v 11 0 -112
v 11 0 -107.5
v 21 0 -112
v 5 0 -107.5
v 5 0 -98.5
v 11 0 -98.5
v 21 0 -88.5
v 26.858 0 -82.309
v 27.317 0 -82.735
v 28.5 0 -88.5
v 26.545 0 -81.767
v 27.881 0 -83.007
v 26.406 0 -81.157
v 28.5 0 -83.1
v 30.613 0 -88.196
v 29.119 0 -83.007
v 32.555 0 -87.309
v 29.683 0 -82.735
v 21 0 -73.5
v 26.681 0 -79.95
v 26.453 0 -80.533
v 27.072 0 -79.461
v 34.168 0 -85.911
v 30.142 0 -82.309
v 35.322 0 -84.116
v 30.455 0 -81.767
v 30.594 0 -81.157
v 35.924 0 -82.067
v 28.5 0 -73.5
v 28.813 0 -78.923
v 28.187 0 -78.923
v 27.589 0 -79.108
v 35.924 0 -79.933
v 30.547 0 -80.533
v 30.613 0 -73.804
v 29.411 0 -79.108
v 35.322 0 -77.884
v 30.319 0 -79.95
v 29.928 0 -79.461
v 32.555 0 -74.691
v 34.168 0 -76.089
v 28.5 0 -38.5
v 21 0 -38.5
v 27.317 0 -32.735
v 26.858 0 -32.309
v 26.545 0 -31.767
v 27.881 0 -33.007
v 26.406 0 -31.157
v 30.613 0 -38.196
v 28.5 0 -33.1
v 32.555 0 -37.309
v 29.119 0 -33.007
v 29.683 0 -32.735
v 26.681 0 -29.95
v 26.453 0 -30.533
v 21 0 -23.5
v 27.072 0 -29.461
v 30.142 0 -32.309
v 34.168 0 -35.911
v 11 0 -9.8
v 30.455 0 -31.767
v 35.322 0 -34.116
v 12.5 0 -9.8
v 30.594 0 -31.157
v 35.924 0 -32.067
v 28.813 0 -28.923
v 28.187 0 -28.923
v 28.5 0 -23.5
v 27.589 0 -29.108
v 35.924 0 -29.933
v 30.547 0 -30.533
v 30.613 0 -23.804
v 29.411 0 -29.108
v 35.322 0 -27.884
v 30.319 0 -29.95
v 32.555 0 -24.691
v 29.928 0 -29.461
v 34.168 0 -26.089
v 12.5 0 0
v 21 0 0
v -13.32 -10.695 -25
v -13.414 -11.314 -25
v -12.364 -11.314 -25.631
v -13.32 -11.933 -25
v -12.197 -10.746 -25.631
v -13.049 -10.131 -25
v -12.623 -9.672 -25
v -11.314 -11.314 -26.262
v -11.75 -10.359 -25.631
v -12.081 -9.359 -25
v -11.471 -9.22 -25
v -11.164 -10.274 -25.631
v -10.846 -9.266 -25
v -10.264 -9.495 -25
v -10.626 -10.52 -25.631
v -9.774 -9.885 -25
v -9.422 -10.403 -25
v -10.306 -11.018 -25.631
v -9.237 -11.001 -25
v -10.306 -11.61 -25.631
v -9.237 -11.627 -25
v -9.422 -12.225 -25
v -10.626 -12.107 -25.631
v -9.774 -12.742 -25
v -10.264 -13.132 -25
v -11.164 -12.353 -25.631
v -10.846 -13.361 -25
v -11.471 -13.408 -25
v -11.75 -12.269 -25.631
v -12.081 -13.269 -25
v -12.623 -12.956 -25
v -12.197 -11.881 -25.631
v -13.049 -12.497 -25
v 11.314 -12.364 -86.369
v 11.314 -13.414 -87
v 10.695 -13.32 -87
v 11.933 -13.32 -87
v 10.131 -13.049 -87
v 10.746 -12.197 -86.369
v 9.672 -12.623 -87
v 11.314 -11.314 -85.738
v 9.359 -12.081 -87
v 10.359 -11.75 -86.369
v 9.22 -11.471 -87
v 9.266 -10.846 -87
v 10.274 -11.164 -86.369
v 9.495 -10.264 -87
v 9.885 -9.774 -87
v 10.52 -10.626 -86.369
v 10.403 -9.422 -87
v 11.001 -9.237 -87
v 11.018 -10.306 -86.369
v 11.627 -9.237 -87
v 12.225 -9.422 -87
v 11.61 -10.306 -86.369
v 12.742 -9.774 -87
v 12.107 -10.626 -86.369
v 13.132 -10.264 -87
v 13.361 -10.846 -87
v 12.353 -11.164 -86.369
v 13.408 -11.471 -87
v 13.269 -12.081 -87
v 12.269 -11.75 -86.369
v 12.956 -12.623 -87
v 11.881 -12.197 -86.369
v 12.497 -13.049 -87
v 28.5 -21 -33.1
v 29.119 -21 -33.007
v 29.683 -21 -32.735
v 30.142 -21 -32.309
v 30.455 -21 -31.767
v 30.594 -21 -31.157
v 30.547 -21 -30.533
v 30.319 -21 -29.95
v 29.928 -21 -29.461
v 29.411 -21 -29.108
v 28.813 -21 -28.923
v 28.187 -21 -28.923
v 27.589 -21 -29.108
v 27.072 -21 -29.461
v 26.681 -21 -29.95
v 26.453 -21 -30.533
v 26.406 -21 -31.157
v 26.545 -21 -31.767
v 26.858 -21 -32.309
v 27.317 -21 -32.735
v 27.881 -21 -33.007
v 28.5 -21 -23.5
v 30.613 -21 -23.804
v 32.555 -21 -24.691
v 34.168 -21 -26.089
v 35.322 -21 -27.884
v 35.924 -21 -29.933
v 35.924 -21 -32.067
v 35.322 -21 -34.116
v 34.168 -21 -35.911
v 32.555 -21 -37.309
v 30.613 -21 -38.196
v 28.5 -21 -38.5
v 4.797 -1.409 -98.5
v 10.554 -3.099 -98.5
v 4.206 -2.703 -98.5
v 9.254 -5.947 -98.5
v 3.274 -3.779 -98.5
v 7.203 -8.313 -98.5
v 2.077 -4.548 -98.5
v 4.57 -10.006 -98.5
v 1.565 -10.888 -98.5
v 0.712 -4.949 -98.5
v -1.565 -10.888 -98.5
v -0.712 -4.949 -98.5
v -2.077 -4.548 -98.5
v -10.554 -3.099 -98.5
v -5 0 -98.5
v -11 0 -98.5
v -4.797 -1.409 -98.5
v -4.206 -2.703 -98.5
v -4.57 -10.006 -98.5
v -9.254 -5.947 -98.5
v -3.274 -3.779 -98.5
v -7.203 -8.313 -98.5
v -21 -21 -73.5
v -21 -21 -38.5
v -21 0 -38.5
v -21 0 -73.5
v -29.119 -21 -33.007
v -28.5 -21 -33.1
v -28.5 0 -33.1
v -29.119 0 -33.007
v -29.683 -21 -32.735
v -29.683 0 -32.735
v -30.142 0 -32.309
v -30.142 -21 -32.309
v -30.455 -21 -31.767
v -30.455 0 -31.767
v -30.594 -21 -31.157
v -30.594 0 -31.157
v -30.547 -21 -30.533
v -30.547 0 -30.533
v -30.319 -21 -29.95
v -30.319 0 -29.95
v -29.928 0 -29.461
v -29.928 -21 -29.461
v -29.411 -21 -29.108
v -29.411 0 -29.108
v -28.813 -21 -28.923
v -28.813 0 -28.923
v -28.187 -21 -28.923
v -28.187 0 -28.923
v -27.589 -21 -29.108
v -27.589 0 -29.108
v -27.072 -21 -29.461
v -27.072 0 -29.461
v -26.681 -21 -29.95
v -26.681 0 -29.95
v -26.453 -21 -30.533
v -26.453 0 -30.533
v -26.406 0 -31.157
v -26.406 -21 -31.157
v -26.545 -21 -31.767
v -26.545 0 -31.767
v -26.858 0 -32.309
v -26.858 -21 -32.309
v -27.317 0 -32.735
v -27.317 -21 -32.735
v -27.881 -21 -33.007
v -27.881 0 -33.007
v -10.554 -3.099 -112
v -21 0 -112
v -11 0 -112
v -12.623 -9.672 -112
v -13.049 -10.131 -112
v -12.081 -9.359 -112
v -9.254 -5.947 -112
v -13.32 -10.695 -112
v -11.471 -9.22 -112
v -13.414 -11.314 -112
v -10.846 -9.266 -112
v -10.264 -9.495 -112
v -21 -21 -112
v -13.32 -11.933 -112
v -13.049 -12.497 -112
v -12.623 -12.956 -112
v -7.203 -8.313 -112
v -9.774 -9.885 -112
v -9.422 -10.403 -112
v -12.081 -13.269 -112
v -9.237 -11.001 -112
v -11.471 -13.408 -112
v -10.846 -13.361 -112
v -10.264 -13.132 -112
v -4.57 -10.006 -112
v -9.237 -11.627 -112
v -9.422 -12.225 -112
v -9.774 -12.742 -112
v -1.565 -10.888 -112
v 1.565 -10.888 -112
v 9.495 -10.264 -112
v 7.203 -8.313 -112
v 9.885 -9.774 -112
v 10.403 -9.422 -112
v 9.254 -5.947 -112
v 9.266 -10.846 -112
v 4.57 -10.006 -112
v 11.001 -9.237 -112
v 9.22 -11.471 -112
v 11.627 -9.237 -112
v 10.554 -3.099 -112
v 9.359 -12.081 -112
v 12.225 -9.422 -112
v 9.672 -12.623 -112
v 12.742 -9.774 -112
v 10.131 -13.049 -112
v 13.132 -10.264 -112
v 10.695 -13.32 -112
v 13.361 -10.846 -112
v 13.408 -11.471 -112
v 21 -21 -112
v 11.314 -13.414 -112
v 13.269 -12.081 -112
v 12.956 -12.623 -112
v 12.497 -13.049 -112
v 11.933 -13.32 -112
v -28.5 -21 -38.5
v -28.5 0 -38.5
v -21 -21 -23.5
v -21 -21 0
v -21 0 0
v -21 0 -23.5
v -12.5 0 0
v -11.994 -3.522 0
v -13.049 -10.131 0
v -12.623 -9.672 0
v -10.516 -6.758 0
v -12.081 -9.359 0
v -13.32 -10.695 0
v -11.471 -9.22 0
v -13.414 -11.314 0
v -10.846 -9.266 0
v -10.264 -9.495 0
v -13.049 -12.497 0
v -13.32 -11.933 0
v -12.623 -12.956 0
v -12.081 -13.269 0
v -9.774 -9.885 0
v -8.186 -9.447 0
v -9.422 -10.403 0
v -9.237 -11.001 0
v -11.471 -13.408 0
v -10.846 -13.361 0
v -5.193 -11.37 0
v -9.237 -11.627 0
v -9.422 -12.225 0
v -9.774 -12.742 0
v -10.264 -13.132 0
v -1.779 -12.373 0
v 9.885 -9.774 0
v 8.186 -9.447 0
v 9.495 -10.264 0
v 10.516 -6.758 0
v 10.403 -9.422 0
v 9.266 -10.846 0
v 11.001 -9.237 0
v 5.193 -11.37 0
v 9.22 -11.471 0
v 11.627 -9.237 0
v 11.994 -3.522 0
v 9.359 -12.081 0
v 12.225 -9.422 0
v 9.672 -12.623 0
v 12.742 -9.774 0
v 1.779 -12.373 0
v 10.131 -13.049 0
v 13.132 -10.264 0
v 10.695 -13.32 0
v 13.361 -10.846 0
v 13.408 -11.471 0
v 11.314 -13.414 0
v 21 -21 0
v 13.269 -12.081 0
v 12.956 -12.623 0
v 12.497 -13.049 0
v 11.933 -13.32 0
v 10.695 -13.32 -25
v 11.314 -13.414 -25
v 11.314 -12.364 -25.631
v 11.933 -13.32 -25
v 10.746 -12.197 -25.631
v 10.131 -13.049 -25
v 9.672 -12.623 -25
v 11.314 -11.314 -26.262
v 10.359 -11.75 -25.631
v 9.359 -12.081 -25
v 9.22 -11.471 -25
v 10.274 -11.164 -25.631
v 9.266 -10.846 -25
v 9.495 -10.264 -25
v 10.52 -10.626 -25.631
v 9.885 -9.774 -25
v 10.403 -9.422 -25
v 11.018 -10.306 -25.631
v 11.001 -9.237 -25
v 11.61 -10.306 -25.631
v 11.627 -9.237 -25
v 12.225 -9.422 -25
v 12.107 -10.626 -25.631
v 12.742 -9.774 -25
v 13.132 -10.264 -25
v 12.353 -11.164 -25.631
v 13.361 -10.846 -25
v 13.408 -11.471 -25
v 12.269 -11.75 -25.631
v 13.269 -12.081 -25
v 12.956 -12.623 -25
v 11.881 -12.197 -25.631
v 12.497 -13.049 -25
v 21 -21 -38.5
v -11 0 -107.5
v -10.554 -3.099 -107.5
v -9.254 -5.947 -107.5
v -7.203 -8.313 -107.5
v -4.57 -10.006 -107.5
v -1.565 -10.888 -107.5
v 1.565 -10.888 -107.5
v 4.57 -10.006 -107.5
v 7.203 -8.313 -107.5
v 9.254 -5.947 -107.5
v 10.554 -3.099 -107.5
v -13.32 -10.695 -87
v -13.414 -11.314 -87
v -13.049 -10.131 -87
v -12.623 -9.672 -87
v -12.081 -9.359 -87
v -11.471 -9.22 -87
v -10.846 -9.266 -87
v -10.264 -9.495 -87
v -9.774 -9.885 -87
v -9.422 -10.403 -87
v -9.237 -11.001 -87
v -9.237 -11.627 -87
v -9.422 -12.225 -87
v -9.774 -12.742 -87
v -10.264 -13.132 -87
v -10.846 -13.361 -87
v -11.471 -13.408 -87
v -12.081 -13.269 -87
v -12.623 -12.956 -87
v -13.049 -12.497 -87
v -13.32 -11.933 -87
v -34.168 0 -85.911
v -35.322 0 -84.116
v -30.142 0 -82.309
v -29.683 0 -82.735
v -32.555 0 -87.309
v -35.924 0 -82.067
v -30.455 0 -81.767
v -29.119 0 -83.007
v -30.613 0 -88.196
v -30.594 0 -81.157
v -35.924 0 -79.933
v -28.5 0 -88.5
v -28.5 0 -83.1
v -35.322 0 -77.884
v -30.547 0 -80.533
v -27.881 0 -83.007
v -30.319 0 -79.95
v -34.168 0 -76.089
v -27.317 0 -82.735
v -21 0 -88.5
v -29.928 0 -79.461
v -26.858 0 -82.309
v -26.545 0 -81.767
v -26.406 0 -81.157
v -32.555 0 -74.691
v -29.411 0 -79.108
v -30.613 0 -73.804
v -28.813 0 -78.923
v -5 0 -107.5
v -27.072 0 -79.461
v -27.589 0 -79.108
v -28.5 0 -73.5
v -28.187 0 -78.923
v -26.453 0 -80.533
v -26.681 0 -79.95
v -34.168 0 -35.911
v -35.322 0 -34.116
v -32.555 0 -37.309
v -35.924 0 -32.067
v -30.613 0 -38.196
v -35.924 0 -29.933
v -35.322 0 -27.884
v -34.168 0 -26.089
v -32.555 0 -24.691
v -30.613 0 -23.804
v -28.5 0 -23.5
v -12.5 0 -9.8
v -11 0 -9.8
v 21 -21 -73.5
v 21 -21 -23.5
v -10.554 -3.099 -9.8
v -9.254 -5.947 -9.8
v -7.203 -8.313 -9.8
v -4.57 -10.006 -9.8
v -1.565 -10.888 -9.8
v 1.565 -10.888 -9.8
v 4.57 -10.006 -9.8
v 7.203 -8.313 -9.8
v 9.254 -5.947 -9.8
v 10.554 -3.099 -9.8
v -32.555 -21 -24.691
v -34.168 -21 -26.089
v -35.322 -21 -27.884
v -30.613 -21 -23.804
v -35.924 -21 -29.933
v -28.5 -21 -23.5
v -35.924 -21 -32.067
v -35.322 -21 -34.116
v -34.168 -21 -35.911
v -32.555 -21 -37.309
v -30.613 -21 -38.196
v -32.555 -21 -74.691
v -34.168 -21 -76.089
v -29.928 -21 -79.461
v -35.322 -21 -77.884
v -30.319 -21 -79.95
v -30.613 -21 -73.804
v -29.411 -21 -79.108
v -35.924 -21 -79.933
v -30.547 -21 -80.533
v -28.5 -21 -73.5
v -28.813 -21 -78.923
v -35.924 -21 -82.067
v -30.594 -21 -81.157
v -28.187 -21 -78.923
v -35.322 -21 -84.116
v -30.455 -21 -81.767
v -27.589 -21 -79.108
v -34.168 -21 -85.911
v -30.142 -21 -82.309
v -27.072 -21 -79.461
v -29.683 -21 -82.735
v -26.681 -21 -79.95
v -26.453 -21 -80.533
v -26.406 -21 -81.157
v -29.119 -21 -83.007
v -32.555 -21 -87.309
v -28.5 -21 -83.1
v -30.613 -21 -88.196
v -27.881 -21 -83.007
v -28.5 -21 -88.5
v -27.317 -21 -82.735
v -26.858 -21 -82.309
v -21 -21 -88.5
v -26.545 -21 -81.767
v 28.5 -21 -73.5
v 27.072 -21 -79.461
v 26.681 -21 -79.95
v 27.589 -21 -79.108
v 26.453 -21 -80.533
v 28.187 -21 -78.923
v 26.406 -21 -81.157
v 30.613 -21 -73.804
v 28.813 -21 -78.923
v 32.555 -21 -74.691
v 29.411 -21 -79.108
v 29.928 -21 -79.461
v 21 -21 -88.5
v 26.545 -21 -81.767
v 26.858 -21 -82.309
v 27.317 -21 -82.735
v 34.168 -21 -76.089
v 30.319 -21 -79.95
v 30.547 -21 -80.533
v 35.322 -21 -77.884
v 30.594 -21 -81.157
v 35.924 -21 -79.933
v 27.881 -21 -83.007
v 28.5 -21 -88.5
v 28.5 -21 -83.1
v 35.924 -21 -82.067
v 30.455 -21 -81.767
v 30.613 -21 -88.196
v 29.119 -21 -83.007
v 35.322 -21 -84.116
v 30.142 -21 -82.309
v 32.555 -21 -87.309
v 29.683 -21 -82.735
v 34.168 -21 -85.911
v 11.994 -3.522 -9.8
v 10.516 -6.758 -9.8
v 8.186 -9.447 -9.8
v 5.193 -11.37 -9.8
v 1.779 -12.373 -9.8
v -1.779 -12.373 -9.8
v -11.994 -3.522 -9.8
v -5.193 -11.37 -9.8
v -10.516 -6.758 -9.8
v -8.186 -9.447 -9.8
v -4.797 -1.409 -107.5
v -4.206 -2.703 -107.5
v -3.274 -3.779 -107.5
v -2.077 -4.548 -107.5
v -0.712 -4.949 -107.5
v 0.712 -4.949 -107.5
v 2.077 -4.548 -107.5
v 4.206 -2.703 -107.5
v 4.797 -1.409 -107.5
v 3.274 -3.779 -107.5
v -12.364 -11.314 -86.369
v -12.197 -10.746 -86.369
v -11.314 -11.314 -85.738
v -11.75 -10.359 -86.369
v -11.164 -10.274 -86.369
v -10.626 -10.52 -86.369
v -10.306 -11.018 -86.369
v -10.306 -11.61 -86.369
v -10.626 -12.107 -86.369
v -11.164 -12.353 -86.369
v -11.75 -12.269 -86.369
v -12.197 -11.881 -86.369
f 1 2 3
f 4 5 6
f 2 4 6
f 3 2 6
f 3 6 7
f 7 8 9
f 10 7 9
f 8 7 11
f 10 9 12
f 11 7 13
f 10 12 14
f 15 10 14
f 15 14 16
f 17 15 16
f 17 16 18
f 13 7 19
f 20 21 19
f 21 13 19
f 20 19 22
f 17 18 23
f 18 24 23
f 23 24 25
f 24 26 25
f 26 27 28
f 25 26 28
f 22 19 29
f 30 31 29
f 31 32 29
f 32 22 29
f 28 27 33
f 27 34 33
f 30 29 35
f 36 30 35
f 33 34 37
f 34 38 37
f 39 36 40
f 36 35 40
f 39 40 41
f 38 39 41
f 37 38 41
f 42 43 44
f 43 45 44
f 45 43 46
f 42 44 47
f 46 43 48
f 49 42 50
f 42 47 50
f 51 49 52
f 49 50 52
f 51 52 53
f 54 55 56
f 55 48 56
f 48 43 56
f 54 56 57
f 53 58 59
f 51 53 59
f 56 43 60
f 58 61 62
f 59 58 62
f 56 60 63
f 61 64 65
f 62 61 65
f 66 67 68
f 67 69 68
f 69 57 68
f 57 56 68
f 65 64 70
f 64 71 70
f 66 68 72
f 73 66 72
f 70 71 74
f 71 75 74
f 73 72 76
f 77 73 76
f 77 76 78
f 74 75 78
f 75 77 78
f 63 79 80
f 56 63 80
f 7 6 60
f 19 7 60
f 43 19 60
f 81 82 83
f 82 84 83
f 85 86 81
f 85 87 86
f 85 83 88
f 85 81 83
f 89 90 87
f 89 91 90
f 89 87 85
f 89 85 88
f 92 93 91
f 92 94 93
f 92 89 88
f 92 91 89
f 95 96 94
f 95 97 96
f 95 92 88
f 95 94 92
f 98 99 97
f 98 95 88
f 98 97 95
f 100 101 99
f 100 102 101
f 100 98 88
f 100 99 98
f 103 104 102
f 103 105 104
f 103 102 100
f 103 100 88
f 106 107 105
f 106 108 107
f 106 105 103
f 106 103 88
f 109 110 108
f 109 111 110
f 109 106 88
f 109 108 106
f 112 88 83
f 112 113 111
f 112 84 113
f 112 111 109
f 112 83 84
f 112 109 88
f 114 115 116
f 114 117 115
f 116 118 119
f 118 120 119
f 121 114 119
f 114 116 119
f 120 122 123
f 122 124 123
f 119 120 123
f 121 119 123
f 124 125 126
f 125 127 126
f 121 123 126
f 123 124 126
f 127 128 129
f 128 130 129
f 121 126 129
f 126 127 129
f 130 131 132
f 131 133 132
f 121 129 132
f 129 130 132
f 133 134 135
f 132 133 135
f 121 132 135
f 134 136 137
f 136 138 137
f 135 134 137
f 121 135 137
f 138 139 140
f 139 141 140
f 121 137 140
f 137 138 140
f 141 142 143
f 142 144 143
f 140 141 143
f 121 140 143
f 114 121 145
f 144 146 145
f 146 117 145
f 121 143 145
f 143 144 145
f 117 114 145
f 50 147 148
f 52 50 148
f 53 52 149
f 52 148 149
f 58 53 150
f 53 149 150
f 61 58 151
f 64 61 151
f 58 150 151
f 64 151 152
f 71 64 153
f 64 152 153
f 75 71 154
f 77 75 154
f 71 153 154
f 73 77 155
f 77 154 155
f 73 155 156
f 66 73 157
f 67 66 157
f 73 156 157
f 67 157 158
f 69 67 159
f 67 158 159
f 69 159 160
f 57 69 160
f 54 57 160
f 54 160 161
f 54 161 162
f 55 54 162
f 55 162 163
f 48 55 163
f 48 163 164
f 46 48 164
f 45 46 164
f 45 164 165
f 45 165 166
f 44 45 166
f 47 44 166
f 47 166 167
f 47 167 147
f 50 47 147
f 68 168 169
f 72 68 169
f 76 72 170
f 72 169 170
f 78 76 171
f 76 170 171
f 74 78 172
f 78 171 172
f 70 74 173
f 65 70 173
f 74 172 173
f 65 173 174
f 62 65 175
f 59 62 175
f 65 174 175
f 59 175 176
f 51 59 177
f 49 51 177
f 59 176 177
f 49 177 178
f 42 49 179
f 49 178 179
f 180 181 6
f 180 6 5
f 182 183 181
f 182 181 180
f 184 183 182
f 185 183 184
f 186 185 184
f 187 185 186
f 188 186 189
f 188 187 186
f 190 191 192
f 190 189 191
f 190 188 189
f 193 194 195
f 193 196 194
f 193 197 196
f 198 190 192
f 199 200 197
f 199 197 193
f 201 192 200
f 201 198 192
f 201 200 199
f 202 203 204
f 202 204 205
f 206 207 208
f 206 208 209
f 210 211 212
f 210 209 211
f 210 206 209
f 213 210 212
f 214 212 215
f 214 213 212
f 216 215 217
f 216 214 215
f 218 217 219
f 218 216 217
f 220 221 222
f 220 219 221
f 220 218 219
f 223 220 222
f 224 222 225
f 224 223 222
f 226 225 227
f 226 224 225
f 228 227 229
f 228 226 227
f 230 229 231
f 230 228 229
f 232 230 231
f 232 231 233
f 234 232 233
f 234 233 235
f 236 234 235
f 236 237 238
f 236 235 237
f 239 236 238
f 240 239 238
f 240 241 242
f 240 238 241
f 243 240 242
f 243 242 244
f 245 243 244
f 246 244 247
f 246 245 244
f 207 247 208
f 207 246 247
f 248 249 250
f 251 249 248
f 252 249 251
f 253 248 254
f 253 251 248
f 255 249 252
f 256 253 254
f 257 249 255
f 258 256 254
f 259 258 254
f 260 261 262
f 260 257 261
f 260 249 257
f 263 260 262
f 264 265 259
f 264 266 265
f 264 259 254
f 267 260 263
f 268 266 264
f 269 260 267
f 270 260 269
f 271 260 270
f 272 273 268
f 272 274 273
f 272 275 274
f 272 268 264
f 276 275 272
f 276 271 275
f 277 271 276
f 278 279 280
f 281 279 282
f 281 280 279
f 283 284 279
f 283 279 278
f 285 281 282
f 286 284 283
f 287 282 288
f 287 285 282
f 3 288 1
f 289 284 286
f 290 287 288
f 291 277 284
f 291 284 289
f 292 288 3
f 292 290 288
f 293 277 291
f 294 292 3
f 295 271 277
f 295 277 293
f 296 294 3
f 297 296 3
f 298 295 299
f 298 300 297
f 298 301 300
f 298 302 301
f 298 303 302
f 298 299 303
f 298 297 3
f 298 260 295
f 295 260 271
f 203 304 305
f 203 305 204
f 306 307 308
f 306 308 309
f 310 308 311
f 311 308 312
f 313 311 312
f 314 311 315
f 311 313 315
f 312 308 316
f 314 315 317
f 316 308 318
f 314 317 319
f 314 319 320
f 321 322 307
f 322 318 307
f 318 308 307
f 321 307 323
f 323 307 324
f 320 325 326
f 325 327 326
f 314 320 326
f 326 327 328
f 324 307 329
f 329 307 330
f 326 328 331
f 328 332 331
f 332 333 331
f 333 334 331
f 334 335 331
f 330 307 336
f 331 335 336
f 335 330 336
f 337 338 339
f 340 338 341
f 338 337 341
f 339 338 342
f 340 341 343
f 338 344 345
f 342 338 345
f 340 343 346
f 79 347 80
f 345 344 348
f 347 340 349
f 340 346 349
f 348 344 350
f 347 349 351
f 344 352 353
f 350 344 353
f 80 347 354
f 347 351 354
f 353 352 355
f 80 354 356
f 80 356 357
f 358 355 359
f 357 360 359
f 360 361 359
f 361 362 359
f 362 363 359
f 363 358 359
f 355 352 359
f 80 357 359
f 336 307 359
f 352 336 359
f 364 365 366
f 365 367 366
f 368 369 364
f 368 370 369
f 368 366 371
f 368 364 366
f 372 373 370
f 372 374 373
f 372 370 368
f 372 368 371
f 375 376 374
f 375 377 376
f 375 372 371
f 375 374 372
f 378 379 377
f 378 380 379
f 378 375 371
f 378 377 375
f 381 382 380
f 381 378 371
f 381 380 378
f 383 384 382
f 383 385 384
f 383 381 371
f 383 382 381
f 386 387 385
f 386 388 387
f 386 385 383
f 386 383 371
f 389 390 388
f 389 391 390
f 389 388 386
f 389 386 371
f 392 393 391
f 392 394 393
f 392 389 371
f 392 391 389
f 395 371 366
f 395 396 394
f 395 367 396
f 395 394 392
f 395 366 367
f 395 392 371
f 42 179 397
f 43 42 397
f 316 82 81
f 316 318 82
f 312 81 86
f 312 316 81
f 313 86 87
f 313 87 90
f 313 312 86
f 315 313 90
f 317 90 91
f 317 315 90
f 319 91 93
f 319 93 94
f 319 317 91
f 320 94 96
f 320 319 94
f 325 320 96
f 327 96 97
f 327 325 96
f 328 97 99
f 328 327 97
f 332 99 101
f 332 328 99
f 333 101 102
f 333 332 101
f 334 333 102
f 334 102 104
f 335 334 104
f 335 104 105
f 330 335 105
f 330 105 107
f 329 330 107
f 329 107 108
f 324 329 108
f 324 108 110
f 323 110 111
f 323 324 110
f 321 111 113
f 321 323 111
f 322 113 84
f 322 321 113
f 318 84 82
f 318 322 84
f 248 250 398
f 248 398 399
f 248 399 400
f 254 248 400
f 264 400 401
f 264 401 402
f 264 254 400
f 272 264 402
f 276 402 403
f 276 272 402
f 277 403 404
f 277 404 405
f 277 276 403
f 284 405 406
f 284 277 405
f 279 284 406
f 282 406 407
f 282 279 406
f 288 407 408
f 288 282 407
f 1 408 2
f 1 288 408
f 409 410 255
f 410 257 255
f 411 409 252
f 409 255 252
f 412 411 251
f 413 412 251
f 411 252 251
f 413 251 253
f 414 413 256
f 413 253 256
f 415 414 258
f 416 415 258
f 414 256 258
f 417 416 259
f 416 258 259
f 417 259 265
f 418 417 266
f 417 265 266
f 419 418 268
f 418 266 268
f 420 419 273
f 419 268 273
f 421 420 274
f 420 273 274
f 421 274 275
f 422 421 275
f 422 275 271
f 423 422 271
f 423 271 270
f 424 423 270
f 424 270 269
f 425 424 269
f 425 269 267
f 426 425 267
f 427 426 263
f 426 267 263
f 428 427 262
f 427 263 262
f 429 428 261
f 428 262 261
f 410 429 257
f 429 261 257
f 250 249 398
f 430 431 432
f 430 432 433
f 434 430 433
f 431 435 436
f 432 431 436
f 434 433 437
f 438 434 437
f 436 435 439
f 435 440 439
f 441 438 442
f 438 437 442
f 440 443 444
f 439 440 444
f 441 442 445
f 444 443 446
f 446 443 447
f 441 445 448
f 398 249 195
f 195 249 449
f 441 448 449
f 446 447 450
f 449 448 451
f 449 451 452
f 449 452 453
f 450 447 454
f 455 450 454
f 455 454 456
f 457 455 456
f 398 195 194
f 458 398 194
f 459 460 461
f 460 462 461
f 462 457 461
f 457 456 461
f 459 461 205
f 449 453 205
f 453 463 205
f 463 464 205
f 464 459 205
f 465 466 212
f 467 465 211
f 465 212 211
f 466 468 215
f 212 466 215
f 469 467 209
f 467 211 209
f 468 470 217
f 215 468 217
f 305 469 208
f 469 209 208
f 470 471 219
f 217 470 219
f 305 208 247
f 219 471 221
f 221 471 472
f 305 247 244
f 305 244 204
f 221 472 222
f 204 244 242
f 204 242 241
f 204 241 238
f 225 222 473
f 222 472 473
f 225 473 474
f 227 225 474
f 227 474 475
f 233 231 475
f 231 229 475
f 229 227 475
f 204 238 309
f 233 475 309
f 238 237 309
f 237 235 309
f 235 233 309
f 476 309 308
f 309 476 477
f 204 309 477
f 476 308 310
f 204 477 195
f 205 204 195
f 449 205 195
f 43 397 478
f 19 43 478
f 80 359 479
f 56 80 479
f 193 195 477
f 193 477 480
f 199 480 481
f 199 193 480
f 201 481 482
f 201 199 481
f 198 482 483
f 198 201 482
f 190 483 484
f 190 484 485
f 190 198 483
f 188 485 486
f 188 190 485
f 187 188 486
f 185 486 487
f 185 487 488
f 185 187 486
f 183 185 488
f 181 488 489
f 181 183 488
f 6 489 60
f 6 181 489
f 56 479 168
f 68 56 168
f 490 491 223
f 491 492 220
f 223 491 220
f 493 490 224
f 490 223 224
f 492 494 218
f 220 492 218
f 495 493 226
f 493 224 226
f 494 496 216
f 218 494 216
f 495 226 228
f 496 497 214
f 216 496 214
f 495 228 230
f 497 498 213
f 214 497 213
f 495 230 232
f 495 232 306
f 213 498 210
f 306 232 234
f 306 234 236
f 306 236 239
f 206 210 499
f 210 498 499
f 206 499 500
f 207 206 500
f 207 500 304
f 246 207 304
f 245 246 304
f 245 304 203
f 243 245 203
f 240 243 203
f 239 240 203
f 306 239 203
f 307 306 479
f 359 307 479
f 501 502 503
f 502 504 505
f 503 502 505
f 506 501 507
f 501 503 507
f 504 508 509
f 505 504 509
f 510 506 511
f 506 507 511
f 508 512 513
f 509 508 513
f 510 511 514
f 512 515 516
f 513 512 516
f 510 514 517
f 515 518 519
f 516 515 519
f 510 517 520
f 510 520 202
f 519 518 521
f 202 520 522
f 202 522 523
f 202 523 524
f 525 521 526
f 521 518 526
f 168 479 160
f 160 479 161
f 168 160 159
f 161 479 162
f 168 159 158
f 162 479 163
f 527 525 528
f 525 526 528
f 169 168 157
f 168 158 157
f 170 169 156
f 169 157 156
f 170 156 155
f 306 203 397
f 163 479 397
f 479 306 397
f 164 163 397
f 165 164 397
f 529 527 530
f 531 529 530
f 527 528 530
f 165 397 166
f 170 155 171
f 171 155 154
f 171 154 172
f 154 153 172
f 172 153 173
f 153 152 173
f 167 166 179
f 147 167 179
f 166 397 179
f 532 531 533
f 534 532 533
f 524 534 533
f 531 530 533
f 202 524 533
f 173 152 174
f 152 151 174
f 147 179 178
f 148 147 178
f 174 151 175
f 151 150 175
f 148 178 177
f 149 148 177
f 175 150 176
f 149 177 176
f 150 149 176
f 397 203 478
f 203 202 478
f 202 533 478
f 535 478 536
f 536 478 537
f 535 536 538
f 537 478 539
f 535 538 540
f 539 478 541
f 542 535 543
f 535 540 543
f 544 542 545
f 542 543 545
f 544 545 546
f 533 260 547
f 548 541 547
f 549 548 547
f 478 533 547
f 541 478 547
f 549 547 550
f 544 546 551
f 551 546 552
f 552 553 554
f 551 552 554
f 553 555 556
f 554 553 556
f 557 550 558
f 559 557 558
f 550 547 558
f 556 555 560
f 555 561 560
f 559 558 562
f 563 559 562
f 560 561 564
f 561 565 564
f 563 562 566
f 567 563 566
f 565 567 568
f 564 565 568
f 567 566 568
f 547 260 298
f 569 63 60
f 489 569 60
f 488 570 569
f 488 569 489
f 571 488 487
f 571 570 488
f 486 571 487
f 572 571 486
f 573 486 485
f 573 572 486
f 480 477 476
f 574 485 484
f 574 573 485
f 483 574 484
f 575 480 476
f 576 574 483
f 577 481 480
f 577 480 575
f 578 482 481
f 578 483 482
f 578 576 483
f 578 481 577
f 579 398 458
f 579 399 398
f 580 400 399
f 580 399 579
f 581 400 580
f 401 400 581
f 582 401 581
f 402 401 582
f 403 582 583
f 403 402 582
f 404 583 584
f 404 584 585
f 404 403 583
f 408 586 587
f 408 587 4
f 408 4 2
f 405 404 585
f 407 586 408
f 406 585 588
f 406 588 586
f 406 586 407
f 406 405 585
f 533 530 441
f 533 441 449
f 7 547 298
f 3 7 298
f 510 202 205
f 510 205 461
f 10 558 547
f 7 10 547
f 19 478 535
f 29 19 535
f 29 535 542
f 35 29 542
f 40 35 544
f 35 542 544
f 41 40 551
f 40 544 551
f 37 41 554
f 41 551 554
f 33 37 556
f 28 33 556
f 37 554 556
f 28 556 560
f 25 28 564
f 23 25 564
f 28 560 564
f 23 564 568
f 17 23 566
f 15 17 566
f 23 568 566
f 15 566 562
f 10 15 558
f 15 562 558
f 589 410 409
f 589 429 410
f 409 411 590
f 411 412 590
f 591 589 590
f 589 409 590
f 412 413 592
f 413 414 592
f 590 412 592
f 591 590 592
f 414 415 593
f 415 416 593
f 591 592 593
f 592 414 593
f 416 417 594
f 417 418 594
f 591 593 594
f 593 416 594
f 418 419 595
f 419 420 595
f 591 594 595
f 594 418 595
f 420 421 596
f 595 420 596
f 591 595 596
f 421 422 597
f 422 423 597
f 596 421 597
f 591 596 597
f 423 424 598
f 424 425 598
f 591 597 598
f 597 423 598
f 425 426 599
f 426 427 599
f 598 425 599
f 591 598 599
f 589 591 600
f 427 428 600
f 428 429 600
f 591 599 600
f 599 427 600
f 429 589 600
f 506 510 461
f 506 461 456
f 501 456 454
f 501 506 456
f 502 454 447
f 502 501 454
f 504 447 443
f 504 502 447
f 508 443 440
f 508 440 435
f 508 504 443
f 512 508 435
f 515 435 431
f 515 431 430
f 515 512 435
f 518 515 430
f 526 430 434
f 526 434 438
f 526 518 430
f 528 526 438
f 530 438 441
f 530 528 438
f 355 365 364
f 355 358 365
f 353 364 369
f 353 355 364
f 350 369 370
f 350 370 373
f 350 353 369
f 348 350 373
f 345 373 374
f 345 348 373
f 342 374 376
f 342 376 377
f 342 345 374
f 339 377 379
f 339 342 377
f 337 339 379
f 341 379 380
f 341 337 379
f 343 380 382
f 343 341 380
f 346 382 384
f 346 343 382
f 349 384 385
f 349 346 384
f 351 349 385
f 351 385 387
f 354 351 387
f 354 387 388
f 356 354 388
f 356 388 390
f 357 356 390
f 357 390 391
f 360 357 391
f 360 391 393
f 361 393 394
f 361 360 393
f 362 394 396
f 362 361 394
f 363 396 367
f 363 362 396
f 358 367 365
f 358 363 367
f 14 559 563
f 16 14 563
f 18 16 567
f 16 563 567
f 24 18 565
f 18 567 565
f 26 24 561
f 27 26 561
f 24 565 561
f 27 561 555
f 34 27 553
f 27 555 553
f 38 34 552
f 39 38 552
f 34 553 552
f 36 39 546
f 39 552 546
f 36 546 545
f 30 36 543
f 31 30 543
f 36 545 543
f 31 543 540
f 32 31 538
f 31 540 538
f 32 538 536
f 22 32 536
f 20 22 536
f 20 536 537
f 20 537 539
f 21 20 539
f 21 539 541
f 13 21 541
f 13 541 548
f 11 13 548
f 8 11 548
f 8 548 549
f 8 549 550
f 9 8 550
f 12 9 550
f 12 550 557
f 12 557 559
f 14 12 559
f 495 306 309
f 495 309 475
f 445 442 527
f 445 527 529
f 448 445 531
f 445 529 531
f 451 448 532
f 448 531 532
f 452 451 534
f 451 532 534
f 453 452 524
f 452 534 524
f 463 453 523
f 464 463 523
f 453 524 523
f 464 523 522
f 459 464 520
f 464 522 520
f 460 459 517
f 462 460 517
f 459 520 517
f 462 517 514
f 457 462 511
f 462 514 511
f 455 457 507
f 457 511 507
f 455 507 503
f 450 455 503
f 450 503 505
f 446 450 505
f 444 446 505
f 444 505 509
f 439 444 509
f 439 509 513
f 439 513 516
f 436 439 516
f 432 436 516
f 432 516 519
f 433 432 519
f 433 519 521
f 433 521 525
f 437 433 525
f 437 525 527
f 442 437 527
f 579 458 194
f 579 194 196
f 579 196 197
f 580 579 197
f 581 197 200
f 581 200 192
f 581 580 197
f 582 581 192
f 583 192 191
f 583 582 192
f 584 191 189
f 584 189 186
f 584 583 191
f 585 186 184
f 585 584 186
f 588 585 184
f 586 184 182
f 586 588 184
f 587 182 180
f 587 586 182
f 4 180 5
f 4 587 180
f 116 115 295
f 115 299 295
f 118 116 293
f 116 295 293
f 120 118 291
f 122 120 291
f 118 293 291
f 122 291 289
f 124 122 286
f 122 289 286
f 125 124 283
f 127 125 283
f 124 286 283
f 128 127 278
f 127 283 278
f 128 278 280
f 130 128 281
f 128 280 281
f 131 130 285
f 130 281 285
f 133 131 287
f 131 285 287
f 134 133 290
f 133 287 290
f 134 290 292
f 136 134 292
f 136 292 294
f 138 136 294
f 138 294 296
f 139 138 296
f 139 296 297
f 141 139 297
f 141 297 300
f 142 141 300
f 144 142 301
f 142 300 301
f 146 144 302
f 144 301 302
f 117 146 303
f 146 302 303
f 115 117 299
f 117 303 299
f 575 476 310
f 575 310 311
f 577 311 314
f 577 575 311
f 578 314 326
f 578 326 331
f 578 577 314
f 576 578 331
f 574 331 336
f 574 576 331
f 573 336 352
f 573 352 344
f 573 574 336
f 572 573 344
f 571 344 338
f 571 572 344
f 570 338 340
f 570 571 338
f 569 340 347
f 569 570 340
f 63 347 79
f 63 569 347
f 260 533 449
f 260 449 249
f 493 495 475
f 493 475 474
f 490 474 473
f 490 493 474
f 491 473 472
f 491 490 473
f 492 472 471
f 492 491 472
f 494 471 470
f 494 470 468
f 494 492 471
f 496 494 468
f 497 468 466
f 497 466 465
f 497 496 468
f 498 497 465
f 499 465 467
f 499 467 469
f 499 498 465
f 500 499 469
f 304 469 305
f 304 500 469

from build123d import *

# Parameters (mm, degrees)
SKETCH_1_W               = 21
SKETCH_1_H               = 112
CUT_EXTRUDE_1_REACH      = 117.871
SKETCH_3_W               = 42
SKETCH_3_H               = 25
EXTRUDE_1_REACH          = 117.871
SKETCH_4_W               = 42
SKETCH_4_H               = 112
EXTRUDE_2_DEPTH          = 21
HOLE_WIZARD_M51_D        = 4.2
PATTERN_LINEAR_1_COUNT   = 2
PATTERN_LINEAR_1_PITCH   = 50
MIRROR_1_COPY_1_DEPTH    = 21
MIRROR_1_COPY_2_D        = 4.2
PATTERN_CIRCULAR_1_COUNT = 2
PATTERN_CIRCULAR_1_ANGLE = 90


with BuildPart() as part:
    # Эскиз1 → Повернуть1 (revolve)
    with BuildSketch(Plane(origin=(0, 0, 0), x_dir=(1, 0, 0), z_dir=(0, 1, 0))):
        with Locations((10.5, 56)):
            Rectangle(SKETCH_1_W, SKETCH_1_H)
    revolve(axis=Axis((0, 0, 0), (0, 0, -1)))

    # Эскиз2 → Вырез-Повернуть1 (revolve, cut)
    with BuildSketch(Plane(origin=(0, 0, 0), x_dir=(1, 0, 0), z_dir=(0, 1, 0)), mode=Mode.PRIVATE) as cut_revolve_1_sk:
        Polygon((0, 0), (12.5, 0), (12.5, 9.8), (11, 9.8), (11, 98.5), (5, 98.5), (5, 107.5), (11, 107.5), (11, 112), (0, 112), align=None)
    revolve(cut_revolve_1_sk.sketch.rotate(Axis((0, 0, -112), (0, 0, 1)), 180), axis=Axis((0, 0, -112), (0, 0, 1)), mode=Mode.SUBTRACT)

    # Вырез-Вытянуть1: up to this face of the body (flat: up to its plane)
    cut_extrude_1_end = Plane(part.part.faces().sort_by_distance((-20.406030304, 0, -112))[0])
    # Эскиз3 → Вырез-Вытянуть1 (cut, up to the picked face)
    with BuildSketch(Plane.XY, mode=Mode.PRIVATE) as cut_extrude_1_sk1:
        with Locations((0, 12.5)):
            Rectangle(SKETCH_3_W, SKETCH_3_H)
    cut_extrude_1_tool1 = split(extrude(cut_extrude_1_sk1.sketch, amount=-CUT_EXTRUDE_1_REACH, mode=Mode.PRIVATE), bisect_by=cut_extrude_1_end, keep=Keep.BOTH, mode=Mode.PRIVATE)
    add(cut_extrude_1_tool1.solids().sort_by(Axis((0, 12.5, 0), (0, 0, -1)))[0], mode=Mode.SUBTRACT)

    # Эскиз4 → Бобышка-Вытянуть1 (add, up to next)
    with BuildSketch(Plane(origin=(0, -21, 0), x_dir=(1, 0, 0), z_dir=(0, 1, 0)), mode=Mode.PRIVATE) as extrude_1_sk1:
        with Locations((0, 56)):
            Rectangle(SKETCH_4_W, SKETCH_4_H)
    extrude_1_tool1 = extrude(extrude_1_sk1.sketch, amount=EXTRUDE_1_REACH, mode=Mode.PRIVATE) - part.part
    add(extrude_1_tool1.solids().sort_by_distance((0, -21, -56))[0])
    add(extrude_1_tool1.solids().sort_by_distance((0, -21, -56))[1])

    # Эскиз5 → Бобышка-Вытянуть2 (add)
    with BuildSketch(Plane(origin=(0, -21, 0), x_dir=(1, 0, 0), z_dir=(0, 1, 0))):
        with BuildLine():
            Line((21, 23.5), (28.5, 23.5))
            ThreePointArc((28.5, 23.5), (36, 31), (28.5, 38.5))
            Line((28.5, 38.5), (21, 38.5))
            Line((21, 38.5), (21, 23.5))
        make_face()
    extrude_2 = extrude(amount=EXTRUDE_2_DEPTH)

    # Сверление под метчик M51 (through all)
    with Locations(Plane(origin=(28.5, 0, -31), x_dir=(0, 0, 1), z_dir=(0, 1, 0))):
        with Locations((0, 0)):
            hole_wizard_m51 = Hole(HOLE_WIZARD_M51_D / 2)

    # Линейный массив1: Бобышка-Вытянуть2, Сверление под метчик M51 ×2
    with Locations(*[(0, 0, -i * PATTERN_LINEAR_1_PITCH) for i in range(1, PATTERN_LINEAR_1_COUNT)]):
        add(extrude_2)
        add(hole_wizard_m51, mode=Mode.SUBTRACT)

    # Зеркальное отражение1: Бобышка-Вытянуть2, Сверление под метчик M51 across plane
    add(extrude_2.mirror(Plane(origin=(0, 0, 0), x_dir=(0, 0, 1), z_dir=(1, 0, 0))))
    add(hole_wizard_m51.mirror(Plane(origin=(0, 0, 0), x_dir=(0, 0, 1), z_dir=(1, 0, 0))), mode=Mode.SUBTRACT)

    # Зеркальное отражение1 copy 1 sketch → Зеркальное отражение1 copy 1 (add)
    with BuildSketch(Plane(origin=(0, -21, -50), x_dir=(-1, 0, 0), z_dir=(0, 1, 0))):
        with BuildLine():
            Line((21, -23.5), (28.5, -23.5))
            ThreePointArc((28.5, -23.5), (36, -31), (28.5, -38.5))
            Line((28.5, -38.5), (21, -38.5))
            Line((21, -38.5), (21, -23.5))
        make_face()
    extrude(amount=MIRROR_1_COPY_1_DEPTH)

    # Зеркальное отражение1 copy 2 (through all)
    with Locations(Plane(origin=(-28.5, 0, -81), x_dir=(0, 0, 1), z_dir=(0, 1, 0))):
        with Locations((0, 0)):
            Hole(MIRROR_1_COPY_2_D / 2)

    # Эскиз8 → Сверление под метчик M52 (revolve, cut)
    with BuildSketch(Plane(origin=(11.313708499, -11.313708499, 0), x_dir=(0, -1, 0), z_dir=(1, 0, 0))):
        Polygon((0, 0), (0, 26.2618073), (2.1, 25), (2.1, 0), align=None)
    hole_wizard_m52 = revolve(axis=Axis((11.313708499, -11.313708499, 6.35), (0, 0, -1)), mode=Mode.SUBTRACT)

    # Круговой массив1: Сверление под метчик M52 ×2 about axis
    pattern_circular_1_axis = Axis((0, 0, 0), (0, 0, -1))
    for i in range(1, PATTERN_CIRCULAR_1_COUNT):
        add(hole_wizard_m52.rotate(pattern_circular_1_axis, i * PATTERN_CIRCULAR_1_ANGLE / (PATTERN_CIRCULAR_1_COUNT - 1)), mode=Mode.SUBTRACT)

    # Зеркальное отражение2: Сверление под метчик M52 across plane
    add(hole_wizard_m52.mirror(Plane.XY.offset(-56)), mode=Mode.SUBTRACT)

    # Зеркальное отражение2 copy 1 sketch → Зеркальное отражение2 copy 1 (revolve, cut)
    with BuildSketch(Plane(origin=(-11.313708499, -11.313708499, -112), x_dir=(-1, 0, 0), z_dir=(0, -1, 0))):
        Polygon((0, 0), (0, -26.2618073), (2.1, -25), (2.1, 0), align=None)
    revolve(axis=Axis((-11.313708499, -11.313708499, -118.35), (0, 0, -1)), mode=Mode.SUBTRACT)


solid = part.part
